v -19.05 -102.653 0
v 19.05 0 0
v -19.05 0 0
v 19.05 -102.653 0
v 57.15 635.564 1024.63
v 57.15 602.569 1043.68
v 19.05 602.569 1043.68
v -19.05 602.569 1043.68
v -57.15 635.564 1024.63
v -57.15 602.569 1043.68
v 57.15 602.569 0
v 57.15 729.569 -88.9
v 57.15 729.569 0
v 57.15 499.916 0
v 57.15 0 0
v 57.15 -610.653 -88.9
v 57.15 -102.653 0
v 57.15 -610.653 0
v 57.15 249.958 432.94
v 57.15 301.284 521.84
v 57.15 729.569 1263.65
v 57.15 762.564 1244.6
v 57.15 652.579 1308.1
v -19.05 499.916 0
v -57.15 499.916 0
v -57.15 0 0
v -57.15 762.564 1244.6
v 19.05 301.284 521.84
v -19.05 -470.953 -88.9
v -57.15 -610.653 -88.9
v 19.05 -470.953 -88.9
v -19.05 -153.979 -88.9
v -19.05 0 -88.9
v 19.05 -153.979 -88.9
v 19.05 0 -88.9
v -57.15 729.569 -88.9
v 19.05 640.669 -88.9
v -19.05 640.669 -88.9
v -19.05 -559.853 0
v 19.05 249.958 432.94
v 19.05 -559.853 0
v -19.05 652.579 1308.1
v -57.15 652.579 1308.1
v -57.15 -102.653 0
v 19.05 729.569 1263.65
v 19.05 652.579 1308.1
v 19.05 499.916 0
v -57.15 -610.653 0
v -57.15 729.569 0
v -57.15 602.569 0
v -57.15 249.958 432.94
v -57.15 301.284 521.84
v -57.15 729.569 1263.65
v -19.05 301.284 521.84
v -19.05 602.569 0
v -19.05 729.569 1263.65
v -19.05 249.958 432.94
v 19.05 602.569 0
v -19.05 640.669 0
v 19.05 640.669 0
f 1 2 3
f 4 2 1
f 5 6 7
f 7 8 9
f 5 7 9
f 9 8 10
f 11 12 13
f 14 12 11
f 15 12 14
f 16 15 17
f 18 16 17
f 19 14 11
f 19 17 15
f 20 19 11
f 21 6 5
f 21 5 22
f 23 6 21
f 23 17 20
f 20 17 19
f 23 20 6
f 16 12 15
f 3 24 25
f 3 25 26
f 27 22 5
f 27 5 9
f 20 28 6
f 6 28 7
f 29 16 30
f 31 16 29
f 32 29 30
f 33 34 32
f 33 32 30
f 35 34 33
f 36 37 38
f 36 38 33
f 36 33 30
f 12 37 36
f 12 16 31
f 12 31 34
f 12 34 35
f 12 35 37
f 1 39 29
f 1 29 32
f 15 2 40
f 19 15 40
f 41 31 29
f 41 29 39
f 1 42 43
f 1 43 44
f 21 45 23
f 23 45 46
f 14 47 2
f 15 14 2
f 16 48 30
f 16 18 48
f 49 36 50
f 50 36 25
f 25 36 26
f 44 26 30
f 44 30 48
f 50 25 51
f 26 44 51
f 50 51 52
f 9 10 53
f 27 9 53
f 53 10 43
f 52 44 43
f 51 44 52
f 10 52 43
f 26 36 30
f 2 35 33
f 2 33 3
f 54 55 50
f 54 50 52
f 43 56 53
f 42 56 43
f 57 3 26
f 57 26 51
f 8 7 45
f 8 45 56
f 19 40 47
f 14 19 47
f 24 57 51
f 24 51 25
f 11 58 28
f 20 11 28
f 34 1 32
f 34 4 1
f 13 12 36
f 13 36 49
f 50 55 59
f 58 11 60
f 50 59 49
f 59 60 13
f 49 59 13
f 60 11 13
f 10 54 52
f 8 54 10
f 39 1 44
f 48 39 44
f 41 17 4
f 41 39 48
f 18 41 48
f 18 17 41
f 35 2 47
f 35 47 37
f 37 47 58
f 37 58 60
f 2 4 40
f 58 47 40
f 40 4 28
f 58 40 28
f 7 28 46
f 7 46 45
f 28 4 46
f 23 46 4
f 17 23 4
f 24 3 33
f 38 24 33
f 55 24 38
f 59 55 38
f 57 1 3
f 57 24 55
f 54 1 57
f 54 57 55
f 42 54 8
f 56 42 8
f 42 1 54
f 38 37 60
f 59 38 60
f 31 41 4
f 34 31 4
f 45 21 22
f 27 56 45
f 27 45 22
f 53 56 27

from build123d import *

# Parameters (mm, degrees)
F3_DEPTH = 38.1
F4_W     = 88.9
F4_H     = 88.9
F5_DEPTH = 19.05
F7_W     = 114.3
F7_H     = 254
F8_DEPTH = 38.1


with BuildPart() as f3:
    # F2 (on offset) → F3 (new body)
    with BuildSketch(Plane.YZ.offset(19.05)):
        Polygon((729.5686676615, 1263.65), (652.579009265, 1308.1), (-102.6528778619, 0), (-610.6528778619, 0), (-610.6528778619, -88.9), (729.5686676615, -88.9), (729.5686676615, 0), (602.5686676615, 0), (301.2843338307, 521.8397737194), align=None)
        Polygon((499.9157897996, 0), (0, 0), (249.9578948998, 432.9397737194), align=None, mode=Mode.SUBTRACT)
    extrude(amount=F3_DEPTH)

    # F4 (on Right) → F5 (join, through all)
    with BuildSketch(Plane.YZ):
        with Locations((685.1186676615, -44.45)):
            Rectangle(F4_W, F4_H)
        Polygon((-559.8528778619, 0), (-610.6528778619, 0), (-610.6528778619, -88.9), (-470.9528778619, -88.9), align=None)
        Polygon((0, -88.9), (0, 0), (-102.6528778619, 0), (-153.9793167929, -88.9), align=None)
    extrude(amount=F5_DEPTH)

    # F6: F3 across plane


with BuildPart() as f3_1:
    add(f3.part)
    add(f3.part.mirror(Plane.YZ))

    # F7 (on face) → F8 (join)
    with BuildSketch(Plane(origin=(0, 0, 0), x_dir=(-1, 0, 0), z_dir=(0, 0.8660254038, -0.5))):
        with Locations((0, 1332.1373353229)):
            Rectangle(F7_W, F7_H)
    extrude(amount=F8_DEPTH)


solid = f3_1.part
